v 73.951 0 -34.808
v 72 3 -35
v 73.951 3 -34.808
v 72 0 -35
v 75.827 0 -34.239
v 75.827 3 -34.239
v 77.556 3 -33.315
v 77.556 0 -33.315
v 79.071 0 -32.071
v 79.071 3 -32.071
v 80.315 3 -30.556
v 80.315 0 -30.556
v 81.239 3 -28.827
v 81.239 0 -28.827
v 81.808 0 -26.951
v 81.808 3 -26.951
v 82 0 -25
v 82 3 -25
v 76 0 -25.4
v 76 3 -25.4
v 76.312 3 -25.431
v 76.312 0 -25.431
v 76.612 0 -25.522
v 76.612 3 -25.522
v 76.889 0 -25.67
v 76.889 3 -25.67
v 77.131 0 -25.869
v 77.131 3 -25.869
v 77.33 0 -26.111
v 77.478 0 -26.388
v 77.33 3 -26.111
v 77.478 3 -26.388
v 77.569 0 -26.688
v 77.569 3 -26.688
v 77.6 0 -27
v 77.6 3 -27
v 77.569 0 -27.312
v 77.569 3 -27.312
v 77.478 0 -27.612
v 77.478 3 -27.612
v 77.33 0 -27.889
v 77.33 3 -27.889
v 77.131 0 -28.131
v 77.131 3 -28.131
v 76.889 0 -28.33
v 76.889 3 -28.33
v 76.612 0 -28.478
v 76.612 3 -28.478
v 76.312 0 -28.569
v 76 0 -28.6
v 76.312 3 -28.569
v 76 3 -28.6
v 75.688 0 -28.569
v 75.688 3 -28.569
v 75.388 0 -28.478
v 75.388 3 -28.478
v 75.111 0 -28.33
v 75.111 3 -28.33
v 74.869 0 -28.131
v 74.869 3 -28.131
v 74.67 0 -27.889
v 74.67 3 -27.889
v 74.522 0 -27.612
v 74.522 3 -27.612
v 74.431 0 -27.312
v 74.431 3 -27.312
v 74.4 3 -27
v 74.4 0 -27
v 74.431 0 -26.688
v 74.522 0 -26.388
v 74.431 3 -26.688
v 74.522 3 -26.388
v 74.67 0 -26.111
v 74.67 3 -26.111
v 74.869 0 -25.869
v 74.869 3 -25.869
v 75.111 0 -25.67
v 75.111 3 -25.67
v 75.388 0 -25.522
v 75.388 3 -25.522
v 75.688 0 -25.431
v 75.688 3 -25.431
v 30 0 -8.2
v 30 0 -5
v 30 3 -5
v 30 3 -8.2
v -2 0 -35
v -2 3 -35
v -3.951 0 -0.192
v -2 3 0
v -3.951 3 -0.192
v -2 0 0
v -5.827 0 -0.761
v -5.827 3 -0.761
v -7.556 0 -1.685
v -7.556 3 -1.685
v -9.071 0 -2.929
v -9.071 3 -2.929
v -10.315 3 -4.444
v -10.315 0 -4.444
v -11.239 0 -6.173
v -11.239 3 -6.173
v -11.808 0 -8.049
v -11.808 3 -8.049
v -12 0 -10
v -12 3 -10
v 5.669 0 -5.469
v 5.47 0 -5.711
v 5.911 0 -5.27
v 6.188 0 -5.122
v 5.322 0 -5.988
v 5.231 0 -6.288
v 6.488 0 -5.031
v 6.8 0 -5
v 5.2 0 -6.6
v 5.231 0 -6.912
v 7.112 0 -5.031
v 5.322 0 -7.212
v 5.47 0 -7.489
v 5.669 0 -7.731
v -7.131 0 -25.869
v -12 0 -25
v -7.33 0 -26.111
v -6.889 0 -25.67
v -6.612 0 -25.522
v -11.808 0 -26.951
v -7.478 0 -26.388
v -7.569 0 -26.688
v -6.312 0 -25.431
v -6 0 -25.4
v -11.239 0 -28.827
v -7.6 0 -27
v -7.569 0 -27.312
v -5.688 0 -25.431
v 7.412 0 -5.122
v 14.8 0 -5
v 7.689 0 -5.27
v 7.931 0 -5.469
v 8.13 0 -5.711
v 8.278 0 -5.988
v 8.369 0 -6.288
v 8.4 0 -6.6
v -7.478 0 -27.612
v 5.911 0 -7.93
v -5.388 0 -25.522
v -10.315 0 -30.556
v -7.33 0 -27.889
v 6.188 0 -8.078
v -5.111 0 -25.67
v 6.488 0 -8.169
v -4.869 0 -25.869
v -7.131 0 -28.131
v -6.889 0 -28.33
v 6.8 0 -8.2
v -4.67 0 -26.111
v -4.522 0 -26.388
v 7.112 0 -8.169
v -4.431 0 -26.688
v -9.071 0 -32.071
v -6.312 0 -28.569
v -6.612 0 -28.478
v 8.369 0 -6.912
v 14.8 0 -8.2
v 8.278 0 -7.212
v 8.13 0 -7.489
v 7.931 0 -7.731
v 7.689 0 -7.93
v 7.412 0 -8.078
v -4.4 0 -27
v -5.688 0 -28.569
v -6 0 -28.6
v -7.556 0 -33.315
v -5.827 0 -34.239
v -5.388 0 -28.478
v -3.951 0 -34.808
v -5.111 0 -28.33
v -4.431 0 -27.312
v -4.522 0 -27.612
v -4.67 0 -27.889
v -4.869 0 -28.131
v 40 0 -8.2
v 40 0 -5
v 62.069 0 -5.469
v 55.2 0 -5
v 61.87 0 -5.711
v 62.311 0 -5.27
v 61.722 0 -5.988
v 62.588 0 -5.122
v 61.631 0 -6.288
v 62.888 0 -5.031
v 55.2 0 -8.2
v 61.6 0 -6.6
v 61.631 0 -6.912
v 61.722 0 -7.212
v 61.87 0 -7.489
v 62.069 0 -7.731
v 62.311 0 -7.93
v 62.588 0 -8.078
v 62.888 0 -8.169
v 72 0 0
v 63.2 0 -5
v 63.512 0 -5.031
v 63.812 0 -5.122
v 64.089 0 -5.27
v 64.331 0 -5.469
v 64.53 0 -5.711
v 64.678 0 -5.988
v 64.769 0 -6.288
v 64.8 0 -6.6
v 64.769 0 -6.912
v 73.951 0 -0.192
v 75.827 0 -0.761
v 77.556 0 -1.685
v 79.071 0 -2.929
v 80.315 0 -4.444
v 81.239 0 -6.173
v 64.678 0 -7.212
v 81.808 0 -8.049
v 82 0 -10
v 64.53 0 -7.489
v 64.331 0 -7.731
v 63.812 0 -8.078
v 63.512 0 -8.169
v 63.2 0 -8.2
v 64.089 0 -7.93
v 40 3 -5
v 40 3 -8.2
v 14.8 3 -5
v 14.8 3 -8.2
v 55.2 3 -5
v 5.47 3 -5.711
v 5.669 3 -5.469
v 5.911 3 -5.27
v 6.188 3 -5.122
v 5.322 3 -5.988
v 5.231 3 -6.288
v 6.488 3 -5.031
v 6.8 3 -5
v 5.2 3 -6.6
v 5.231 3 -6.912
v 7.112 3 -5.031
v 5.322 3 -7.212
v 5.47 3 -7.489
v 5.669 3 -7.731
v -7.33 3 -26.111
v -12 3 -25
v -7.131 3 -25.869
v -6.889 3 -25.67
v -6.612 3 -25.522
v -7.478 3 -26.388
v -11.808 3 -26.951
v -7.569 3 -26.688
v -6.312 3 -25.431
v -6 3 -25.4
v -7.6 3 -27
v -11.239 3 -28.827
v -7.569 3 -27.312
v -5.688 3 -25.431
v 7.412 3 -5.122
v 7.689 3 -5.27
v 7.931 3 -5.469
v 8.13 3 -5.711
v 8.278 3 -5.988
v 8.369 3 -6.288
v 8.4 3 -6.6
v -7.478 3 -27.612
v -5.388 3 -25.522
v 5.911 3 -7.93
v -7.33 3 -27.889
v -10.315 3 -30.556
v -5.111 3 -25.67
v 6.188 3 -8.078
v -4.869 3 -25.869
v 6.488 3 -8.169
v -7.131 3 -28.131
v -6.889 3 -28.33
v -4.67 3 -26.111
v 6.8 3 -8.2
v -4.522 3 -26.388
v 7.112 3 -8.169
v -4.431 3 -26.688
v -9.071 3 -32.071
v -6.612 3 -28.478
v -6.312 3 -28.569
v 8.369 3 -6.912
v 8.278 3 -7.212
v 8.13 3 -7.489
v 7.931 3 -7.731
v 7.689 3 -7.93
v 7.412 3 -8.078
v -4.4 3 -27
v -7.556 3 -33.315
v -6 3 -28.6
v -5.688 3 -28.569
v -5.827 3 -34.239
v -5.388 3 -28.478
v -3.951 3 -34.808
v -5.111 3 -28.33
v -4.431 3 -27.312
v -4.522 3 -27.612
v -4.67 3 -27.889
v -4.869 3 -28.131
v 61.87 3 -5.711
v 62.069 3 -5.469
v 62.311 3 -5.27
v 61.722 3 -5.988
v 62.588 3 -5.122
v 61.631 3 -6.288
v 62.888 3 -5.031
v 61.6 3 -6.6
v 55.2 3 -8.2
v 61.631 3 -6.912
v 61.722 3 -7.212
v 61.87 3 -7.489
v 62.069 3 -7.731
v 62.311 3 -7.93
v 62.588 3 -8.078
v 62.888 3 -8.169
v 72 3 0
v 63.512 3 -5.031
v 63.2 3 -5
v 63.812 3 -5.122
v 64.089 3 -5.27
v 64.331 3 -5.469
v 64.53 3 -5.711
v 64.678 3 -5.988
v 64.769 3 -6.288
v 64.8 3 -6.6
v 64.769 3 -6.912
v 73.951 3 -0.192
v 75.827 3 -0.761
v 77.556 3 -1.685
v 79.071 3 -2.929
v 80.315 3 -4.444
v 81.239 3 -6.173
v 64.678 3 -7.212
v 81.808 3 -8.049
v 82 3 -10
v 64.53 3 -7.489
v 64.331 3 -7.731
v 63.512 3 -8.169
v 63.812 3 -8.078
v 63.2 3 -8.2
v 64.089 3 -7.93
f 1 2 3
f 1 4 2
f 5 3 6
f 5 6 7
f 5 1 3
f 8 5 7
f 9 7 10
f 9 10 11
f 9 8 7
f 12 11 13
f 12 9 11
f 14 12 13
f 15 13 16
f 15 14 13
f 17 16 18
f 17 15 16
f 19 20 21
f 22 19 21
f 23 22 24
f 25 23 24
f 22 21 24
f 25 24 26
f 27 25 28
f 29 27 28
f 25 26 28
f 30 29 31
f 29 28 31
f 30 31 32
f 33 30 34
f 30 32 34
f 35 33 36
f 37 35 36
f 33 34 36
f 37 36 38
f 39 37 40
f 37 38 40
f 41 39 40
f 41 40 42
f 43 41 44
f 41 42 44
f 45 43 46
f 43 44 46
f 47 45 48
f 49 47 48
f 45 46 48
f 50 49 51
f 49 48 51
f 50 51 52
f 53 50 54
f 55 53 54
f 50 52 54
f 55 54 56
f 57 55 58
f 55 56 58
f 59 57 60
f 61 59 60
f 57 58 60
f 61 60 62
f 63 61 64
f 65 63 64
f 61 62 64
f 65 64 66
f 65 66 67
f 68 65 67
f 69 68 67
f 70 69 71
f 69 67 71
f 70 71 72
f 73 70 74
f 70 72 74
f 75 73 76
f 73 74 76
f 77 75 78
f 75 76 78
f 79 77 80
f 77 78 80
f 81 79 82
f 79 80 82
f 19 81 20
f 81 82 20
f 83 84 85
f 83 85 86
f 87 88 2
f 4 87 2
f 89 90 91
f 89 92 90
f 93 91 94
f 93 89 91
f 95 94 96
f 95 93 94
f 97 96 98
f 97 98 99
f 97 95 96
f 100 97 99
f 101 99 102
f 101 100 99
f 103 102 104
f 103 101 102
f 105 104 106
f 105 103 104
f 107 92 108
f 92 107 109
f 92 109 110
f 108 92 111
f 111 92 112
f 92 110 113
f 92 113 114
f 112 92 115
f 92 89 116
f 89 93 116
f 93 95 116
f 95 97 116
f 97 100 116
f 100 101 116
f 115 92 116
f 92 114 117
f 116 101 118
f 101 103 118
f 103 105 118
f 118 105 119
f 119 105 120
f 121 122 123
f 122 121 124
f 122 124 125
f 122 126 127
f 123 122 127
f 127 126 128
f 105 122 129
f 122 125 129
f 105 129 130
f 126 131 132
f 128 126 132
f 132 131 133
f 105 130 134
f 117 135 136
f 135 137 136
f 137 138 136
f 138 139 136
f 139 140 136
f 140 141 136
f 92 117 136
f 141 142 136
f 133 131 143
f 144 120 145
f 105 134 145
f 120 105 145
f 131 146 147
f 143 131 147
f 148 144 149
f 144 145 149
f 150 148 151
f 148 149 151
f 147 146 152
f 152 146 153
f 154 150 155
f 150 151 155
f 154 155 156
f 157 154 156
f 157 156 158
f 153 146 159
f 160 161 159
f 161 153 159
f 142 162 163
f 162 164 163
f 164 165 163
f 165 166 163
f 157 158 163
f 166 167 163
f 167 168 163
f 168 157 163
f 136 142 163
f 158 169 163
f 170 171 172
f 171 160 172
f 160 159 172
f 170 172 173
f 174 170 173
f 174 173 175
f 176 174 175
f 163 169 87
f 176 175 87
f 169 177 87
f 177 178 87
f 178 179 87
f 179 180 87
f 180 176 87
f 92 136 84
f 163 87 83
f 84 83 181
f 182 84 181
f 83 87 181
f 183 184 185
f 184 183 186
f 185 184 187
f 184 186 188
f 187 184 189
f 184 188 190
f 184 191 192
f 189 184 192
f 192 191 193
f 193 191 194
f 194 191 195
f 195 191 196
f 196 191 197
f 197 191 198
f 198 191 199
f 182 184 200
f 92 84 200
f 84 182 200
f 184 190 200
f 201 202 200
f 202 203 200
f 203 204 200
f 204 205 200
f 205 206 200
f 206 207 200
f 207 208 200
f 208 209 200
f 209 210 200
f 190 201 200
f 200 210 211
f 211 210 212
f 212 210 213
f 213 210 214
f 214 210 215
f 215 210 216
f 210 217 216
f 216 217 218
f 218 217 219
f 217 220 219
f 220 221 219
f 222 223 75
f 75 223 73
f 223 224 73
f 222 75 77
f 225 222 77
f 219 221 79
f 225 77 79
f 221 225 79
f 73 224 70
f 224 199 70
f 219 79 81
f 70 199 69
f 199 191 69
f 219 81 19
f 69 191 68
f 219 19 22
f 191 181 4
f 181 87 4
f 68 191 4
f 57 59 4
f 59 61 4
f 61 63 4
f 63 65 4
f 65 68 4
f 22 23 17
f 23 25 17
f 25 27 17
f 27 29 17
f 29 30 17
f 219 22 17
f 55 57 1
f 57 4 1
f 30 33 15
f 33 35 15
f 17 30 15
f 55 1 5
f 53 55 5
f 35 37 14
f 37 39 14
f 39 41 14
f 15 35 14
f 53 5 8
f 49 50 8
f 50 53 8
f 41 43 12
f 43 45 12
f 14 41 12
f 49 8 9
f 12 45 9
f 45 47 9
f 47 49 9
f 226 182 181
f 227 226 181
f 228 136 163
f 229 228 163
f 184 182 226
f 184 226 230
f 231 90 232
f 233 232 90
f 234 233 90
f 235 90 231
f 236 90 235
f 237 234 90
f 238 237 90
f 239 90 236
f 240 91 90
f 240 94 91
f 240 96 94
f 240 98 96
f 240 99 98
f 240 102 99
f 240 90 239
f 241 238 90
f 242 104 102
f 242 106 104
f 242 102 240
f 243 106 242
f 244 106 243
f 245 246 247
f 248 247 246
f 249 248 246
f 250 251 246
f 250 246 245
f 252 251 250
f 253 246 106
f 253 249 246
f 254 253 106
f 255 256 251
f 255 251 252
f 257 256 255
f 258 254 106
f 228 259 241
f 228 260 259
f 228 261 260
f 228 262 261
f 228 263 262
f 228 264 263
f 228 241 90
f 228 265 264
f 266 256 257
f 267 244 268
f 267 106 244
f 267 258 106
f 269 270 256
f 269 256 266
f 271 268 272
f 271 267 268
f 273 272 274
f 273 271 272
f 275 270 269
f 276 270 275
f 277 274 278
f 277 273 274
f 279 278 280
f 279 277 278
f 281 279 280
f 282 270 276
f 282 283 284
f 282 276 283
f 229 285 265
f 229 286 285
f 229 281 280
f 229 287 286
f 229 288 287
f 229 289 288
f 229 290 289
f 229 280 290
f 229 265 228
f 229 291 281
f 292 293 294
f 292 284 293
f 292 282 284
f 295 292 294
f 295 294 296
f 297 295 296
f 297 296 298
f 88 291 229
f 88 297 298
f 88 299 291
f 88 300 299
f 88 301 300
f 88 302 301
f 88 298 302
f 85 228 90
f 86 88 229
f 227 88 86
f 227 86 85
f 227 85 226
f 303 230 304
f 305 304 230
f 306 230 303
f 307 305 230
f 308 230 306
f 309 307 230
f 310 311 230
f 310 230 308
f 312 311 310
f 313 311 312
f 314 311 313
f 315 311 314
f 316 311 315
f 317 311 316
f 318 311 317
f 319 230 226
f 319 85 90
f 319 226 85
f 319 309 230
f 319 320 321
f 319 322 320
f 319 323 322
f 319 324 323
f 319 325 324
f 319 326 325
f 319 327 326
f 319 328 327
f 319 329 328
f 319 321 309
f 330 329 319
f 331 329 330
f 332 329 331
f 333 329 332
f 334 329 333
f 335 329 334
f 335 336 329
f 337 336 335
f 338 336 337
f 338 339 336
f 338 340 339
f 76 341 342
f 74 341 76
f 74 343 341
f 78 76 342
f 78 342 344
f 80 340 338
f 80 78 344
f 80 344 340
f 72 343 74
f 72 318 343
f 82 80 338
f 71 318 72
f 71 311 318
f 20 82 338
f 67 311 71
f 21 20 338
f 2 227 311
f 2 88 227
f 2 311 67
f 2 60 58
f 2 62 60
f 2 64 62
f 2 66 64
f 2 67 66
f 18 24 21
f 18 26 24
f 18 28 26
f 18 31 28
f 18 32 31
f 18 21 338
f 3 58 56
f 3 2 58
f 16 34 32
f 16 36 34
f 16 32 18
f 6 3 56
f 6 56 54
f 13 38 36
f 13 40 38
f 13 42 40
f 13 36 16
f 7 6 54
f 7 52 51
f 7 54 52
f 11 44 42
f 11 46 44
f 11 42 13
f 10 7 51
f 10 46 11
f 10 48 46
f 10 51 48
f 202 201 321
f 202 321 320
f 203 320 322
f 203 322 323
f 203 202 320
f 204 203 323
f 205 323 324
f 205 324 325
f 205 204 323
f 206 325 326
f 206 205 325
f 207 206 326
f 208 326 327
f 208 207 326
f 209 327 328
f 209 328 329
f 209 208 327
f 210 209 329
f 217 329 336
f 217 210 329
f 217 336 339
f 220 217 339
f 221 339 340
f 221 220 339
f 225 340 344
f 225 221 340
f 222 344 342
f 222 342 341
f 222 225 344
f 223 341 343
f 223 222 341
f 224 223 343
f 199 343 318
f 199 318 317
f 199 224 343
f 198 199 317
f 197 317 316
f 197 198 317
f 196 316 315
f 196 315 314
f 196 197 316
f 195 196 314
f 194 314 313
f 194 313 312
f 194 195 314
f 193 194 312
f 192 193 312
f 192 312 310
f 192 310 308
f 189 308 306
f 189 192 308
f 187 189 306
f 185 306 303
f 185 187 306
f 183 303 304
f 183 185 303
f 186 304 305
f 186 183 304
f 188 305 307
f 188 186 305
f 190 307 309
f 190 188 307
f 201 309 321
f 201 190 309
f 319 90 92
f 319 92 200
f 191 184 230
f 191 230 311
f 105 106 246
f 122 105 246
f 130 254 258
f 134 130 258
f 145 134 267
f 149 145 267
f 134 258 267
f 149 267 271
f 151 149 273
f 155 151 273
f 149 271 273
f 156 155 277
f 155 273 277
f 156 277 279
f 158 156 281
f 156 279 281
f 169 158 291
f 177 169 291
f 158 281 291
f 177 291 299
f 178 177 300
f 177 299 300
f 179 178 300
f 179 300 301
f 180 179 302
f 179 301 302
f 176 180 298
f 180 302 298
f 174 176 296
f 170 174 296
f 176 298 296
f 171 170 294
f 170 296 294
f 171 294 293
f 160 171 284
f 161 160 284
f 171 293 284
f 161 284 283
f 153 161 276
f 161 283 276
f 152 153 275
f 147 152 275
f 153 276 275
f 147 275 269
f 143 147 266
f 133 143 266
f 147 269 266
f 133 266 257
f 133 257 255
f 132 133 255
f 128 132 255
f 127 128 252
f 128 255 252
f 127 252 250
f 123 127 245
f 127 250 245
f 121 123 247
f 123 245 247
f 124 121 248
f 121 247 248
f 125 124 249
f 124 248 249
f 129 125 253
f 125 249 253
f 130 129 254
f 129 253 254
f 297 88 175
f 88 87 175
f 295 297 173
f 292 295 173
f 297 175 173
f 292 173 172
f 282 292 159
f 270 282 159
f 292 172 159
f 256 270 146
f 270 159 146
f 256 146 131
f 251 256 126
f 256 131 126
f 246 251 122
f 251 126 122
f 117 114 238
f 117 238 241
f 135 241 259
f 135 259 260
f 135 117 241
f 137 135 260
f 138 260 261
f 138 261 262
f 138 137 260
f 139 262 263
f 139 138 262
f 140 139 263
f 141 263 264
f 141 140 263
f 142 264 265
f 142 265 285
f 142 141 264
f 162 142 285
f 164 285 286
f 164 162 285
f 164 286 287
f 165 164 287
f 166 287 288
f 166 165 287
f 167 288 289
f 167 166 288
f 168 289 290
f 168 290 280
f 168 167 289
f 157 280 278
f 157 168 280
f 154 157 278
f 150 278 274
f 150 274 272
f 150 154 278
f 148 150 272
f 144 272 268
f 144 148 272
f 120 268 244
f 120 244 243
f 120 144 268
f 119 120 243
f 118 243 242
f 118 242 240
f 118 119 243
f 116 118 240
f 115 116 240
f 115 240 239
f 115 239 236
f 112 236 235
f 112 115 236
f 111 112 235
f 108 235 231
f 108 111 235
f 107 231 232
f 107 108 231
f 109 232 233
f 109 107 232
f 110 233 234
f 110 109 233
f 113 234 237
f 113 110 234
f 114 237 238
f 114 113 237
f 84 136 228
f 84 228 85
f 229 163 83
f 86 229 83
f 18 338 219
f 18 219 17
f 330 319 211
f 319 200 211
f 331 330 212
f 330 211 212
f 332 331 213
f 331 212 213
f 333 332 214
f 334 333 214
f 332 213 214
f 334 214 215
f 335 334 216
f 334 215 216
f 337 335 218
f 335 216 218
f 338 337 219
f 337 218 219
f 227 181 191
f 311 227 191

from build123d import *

# Parameters (mm, degrees)
SKETCH1_W           = 70
SKETCH1_H           = 109
SKETCH1_R           = 1.6
SKETCH1_W_2         = 15.2
SKETCH1_H_2         = 3.2
BOSS_EXTRUDE1_DEPTH = 3
SKETCH3_W           = 70
SKETCH3_H           = 74
SKETCH3_R           = 1.6
CUT_EXTRUDE1_DEPTH  = 130.576232389
SKETCH4_W           = 12
SKETCH4_H           = 35
SKETCH4_R           = 1.6
BOSS_EXTRUDE2_DEPTH = 3
FILLET3_R           = 10


with BuildPart() as part:
    # Sketch1 → Boss-Extrude1 (new body)
    with BuildSketch(Plane(origin=(0, 0, 0), x_dir=(1, 0, 0), z_dir=(0, 1, 0))):
        with Locations((35, 54.5)):
            Rectangle(SKETCH1_W, SKETCH1_H)
        with Locations(Location((6.8, 6.6, 0), (0, 0, 270))):
            Circle(SKETCH1_R, mode=Mode.SUBTRACT)
        with Locations(Location((63.2, 6.6, 0), (0, 0, 270))):
            Circle(SKETCH1_R, mode=Mode.SUBTRACT)
        with Locations(Location((6.8, 103, 0), (0, 0, 270))):
            Circle(SKETCH1_R, mode=Mode.SUBTRACT)
        with Locations(Location((63.2, 103, 0), (0, 0, 270))):
            Circle(SKETCH1_R, mode=Mode.SUBTRACT)
        with Locations((22.4, 6.6)):
            Rectangle(SKETCH1_W_2, SKETCH1_H_2, mode=Mode.SUBTRACT)
        with Locations((47.6, 6.6)):
            Rectangle(SKETCH1_W_2, SKETCH1_H_2, mode=Mode.SUBTRACT)
    extrude(amount=BOSS_EXTRUDE1_DEPTH)

    # Sketch3 → Cut-Extrude1 (cut, through all)
    with BuildSketch(Plane(origin=(0, 3, 0), x_dir=(1, 0, 0), z_dir=(0, 1, 0))):
        with Locations((35, 72)):
            Rectangle(SKETCH3_W, SKETCH3_H)
        with Locations((6.8, 103)):
            Circle(SKETCH3_R, mode=Mode.SUBTRACT)
        with Locations((63.2, 103)):
            Circle(SKETCH3_R, mode=Mode.SUBTRACT)
    extrude(amount=-CUT_EXTRUDE1_DEPTH, mode=Mode.SUBTRACT)

    # Sketch4 → Boss-Extrude2 (add)
    # profile 1 of 2: a face of its own
    with BuildSketch(Plane(origin=(0, 3, 0), x_dir=(1, 0, 0), z_dir=(0, 1, 0))):
        with Locations((76, 17.5)):
            Rectangle(SKETCH4_W, SKETCH4_H)
        with Locations(Location((76, 27, 0), (0, 0, 270))):
            Circle(SKETCH4_R, mode=Mode.SUBTRACT)
    # profile 2 of 2: a face of its own
    with BuildSketch(Plane(origin=(0, 3, 0), x_dir=(1, 0, 0), z_dir=(0, 1, 0))):
        with Locations((-6, 17.5)):
            Rectangle(SKETCH4_W, SKETCH4_H)
        with Locations(Location((-6, 27, 0), (0, 0, 270))):
            Circle(SKETCH4_R, mode=Mode.SUBTRACT)
    extrude(amount=-BOSS_EXTRUDE2_DEPTH)

    # Fillet3
    fillet3_edges = [part.edges().sort_by_distance(p)[0] for p in [
        (82, 1.5, -35),
        (82, 1.5, 0),
        (-12, 1.5, 0),
        (-12, 1.5, -35),
    ]]
    fillet(fillet3_edges, radius=FILLET3_R)


solid = part.part
